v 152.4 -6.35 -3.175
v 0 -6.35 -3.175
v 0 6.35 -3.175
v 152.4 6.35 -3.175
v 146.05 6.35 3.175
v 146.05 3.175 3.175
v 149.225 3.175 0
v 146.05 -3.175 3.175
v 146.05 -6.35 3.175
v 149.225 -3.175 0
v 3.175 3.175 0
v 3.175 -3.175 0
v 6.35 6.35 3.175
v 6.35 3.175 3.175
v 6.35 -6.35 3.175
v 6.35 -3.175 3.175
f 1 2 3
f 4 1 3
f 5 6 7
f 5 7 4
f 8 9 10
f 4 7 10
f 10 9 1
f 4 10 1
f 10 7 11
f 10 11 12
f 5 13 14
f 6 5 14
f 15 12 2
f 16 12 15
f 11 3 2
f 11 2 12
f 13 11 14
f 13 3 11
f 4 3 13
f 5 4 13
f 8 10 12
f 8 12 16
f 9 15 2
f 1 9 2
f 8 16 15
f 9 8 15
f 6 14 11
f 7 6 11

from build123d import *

# Parameters (mm, degrees)
F1_DEPTH = 152.4
F3_DEPTH = 6.35


with BuildPart() as f1:
    # F0 (on Right) → F1 (new body)
    with BuildSketch(Plane.YZ):
        Polygon((6.35, -3.175), (6.35, 3.175), (3.175, 3.175), (3.175, 0), (-3.175, 0), (-3.175, 3.175), (-6.35, 3.175), (-6.35, -3.175), align=None)
    extrude(amount=F1_DEPTH)

    # F2 (on Front) → F3 (cut, symmetric)
    with BuildSketch(Plane.XZ):
        Polygon((0, 3.175), (0, -3.175), (6.35, 3.175), align=None)
        Polygon((146.05, 3.175), (152.4, -3.175), (152.4, 3.175), align=None)
    extrude(amount=F3_DEPTH, both=True, mode=Mode.SUBTRACT)


solid = f1.part
